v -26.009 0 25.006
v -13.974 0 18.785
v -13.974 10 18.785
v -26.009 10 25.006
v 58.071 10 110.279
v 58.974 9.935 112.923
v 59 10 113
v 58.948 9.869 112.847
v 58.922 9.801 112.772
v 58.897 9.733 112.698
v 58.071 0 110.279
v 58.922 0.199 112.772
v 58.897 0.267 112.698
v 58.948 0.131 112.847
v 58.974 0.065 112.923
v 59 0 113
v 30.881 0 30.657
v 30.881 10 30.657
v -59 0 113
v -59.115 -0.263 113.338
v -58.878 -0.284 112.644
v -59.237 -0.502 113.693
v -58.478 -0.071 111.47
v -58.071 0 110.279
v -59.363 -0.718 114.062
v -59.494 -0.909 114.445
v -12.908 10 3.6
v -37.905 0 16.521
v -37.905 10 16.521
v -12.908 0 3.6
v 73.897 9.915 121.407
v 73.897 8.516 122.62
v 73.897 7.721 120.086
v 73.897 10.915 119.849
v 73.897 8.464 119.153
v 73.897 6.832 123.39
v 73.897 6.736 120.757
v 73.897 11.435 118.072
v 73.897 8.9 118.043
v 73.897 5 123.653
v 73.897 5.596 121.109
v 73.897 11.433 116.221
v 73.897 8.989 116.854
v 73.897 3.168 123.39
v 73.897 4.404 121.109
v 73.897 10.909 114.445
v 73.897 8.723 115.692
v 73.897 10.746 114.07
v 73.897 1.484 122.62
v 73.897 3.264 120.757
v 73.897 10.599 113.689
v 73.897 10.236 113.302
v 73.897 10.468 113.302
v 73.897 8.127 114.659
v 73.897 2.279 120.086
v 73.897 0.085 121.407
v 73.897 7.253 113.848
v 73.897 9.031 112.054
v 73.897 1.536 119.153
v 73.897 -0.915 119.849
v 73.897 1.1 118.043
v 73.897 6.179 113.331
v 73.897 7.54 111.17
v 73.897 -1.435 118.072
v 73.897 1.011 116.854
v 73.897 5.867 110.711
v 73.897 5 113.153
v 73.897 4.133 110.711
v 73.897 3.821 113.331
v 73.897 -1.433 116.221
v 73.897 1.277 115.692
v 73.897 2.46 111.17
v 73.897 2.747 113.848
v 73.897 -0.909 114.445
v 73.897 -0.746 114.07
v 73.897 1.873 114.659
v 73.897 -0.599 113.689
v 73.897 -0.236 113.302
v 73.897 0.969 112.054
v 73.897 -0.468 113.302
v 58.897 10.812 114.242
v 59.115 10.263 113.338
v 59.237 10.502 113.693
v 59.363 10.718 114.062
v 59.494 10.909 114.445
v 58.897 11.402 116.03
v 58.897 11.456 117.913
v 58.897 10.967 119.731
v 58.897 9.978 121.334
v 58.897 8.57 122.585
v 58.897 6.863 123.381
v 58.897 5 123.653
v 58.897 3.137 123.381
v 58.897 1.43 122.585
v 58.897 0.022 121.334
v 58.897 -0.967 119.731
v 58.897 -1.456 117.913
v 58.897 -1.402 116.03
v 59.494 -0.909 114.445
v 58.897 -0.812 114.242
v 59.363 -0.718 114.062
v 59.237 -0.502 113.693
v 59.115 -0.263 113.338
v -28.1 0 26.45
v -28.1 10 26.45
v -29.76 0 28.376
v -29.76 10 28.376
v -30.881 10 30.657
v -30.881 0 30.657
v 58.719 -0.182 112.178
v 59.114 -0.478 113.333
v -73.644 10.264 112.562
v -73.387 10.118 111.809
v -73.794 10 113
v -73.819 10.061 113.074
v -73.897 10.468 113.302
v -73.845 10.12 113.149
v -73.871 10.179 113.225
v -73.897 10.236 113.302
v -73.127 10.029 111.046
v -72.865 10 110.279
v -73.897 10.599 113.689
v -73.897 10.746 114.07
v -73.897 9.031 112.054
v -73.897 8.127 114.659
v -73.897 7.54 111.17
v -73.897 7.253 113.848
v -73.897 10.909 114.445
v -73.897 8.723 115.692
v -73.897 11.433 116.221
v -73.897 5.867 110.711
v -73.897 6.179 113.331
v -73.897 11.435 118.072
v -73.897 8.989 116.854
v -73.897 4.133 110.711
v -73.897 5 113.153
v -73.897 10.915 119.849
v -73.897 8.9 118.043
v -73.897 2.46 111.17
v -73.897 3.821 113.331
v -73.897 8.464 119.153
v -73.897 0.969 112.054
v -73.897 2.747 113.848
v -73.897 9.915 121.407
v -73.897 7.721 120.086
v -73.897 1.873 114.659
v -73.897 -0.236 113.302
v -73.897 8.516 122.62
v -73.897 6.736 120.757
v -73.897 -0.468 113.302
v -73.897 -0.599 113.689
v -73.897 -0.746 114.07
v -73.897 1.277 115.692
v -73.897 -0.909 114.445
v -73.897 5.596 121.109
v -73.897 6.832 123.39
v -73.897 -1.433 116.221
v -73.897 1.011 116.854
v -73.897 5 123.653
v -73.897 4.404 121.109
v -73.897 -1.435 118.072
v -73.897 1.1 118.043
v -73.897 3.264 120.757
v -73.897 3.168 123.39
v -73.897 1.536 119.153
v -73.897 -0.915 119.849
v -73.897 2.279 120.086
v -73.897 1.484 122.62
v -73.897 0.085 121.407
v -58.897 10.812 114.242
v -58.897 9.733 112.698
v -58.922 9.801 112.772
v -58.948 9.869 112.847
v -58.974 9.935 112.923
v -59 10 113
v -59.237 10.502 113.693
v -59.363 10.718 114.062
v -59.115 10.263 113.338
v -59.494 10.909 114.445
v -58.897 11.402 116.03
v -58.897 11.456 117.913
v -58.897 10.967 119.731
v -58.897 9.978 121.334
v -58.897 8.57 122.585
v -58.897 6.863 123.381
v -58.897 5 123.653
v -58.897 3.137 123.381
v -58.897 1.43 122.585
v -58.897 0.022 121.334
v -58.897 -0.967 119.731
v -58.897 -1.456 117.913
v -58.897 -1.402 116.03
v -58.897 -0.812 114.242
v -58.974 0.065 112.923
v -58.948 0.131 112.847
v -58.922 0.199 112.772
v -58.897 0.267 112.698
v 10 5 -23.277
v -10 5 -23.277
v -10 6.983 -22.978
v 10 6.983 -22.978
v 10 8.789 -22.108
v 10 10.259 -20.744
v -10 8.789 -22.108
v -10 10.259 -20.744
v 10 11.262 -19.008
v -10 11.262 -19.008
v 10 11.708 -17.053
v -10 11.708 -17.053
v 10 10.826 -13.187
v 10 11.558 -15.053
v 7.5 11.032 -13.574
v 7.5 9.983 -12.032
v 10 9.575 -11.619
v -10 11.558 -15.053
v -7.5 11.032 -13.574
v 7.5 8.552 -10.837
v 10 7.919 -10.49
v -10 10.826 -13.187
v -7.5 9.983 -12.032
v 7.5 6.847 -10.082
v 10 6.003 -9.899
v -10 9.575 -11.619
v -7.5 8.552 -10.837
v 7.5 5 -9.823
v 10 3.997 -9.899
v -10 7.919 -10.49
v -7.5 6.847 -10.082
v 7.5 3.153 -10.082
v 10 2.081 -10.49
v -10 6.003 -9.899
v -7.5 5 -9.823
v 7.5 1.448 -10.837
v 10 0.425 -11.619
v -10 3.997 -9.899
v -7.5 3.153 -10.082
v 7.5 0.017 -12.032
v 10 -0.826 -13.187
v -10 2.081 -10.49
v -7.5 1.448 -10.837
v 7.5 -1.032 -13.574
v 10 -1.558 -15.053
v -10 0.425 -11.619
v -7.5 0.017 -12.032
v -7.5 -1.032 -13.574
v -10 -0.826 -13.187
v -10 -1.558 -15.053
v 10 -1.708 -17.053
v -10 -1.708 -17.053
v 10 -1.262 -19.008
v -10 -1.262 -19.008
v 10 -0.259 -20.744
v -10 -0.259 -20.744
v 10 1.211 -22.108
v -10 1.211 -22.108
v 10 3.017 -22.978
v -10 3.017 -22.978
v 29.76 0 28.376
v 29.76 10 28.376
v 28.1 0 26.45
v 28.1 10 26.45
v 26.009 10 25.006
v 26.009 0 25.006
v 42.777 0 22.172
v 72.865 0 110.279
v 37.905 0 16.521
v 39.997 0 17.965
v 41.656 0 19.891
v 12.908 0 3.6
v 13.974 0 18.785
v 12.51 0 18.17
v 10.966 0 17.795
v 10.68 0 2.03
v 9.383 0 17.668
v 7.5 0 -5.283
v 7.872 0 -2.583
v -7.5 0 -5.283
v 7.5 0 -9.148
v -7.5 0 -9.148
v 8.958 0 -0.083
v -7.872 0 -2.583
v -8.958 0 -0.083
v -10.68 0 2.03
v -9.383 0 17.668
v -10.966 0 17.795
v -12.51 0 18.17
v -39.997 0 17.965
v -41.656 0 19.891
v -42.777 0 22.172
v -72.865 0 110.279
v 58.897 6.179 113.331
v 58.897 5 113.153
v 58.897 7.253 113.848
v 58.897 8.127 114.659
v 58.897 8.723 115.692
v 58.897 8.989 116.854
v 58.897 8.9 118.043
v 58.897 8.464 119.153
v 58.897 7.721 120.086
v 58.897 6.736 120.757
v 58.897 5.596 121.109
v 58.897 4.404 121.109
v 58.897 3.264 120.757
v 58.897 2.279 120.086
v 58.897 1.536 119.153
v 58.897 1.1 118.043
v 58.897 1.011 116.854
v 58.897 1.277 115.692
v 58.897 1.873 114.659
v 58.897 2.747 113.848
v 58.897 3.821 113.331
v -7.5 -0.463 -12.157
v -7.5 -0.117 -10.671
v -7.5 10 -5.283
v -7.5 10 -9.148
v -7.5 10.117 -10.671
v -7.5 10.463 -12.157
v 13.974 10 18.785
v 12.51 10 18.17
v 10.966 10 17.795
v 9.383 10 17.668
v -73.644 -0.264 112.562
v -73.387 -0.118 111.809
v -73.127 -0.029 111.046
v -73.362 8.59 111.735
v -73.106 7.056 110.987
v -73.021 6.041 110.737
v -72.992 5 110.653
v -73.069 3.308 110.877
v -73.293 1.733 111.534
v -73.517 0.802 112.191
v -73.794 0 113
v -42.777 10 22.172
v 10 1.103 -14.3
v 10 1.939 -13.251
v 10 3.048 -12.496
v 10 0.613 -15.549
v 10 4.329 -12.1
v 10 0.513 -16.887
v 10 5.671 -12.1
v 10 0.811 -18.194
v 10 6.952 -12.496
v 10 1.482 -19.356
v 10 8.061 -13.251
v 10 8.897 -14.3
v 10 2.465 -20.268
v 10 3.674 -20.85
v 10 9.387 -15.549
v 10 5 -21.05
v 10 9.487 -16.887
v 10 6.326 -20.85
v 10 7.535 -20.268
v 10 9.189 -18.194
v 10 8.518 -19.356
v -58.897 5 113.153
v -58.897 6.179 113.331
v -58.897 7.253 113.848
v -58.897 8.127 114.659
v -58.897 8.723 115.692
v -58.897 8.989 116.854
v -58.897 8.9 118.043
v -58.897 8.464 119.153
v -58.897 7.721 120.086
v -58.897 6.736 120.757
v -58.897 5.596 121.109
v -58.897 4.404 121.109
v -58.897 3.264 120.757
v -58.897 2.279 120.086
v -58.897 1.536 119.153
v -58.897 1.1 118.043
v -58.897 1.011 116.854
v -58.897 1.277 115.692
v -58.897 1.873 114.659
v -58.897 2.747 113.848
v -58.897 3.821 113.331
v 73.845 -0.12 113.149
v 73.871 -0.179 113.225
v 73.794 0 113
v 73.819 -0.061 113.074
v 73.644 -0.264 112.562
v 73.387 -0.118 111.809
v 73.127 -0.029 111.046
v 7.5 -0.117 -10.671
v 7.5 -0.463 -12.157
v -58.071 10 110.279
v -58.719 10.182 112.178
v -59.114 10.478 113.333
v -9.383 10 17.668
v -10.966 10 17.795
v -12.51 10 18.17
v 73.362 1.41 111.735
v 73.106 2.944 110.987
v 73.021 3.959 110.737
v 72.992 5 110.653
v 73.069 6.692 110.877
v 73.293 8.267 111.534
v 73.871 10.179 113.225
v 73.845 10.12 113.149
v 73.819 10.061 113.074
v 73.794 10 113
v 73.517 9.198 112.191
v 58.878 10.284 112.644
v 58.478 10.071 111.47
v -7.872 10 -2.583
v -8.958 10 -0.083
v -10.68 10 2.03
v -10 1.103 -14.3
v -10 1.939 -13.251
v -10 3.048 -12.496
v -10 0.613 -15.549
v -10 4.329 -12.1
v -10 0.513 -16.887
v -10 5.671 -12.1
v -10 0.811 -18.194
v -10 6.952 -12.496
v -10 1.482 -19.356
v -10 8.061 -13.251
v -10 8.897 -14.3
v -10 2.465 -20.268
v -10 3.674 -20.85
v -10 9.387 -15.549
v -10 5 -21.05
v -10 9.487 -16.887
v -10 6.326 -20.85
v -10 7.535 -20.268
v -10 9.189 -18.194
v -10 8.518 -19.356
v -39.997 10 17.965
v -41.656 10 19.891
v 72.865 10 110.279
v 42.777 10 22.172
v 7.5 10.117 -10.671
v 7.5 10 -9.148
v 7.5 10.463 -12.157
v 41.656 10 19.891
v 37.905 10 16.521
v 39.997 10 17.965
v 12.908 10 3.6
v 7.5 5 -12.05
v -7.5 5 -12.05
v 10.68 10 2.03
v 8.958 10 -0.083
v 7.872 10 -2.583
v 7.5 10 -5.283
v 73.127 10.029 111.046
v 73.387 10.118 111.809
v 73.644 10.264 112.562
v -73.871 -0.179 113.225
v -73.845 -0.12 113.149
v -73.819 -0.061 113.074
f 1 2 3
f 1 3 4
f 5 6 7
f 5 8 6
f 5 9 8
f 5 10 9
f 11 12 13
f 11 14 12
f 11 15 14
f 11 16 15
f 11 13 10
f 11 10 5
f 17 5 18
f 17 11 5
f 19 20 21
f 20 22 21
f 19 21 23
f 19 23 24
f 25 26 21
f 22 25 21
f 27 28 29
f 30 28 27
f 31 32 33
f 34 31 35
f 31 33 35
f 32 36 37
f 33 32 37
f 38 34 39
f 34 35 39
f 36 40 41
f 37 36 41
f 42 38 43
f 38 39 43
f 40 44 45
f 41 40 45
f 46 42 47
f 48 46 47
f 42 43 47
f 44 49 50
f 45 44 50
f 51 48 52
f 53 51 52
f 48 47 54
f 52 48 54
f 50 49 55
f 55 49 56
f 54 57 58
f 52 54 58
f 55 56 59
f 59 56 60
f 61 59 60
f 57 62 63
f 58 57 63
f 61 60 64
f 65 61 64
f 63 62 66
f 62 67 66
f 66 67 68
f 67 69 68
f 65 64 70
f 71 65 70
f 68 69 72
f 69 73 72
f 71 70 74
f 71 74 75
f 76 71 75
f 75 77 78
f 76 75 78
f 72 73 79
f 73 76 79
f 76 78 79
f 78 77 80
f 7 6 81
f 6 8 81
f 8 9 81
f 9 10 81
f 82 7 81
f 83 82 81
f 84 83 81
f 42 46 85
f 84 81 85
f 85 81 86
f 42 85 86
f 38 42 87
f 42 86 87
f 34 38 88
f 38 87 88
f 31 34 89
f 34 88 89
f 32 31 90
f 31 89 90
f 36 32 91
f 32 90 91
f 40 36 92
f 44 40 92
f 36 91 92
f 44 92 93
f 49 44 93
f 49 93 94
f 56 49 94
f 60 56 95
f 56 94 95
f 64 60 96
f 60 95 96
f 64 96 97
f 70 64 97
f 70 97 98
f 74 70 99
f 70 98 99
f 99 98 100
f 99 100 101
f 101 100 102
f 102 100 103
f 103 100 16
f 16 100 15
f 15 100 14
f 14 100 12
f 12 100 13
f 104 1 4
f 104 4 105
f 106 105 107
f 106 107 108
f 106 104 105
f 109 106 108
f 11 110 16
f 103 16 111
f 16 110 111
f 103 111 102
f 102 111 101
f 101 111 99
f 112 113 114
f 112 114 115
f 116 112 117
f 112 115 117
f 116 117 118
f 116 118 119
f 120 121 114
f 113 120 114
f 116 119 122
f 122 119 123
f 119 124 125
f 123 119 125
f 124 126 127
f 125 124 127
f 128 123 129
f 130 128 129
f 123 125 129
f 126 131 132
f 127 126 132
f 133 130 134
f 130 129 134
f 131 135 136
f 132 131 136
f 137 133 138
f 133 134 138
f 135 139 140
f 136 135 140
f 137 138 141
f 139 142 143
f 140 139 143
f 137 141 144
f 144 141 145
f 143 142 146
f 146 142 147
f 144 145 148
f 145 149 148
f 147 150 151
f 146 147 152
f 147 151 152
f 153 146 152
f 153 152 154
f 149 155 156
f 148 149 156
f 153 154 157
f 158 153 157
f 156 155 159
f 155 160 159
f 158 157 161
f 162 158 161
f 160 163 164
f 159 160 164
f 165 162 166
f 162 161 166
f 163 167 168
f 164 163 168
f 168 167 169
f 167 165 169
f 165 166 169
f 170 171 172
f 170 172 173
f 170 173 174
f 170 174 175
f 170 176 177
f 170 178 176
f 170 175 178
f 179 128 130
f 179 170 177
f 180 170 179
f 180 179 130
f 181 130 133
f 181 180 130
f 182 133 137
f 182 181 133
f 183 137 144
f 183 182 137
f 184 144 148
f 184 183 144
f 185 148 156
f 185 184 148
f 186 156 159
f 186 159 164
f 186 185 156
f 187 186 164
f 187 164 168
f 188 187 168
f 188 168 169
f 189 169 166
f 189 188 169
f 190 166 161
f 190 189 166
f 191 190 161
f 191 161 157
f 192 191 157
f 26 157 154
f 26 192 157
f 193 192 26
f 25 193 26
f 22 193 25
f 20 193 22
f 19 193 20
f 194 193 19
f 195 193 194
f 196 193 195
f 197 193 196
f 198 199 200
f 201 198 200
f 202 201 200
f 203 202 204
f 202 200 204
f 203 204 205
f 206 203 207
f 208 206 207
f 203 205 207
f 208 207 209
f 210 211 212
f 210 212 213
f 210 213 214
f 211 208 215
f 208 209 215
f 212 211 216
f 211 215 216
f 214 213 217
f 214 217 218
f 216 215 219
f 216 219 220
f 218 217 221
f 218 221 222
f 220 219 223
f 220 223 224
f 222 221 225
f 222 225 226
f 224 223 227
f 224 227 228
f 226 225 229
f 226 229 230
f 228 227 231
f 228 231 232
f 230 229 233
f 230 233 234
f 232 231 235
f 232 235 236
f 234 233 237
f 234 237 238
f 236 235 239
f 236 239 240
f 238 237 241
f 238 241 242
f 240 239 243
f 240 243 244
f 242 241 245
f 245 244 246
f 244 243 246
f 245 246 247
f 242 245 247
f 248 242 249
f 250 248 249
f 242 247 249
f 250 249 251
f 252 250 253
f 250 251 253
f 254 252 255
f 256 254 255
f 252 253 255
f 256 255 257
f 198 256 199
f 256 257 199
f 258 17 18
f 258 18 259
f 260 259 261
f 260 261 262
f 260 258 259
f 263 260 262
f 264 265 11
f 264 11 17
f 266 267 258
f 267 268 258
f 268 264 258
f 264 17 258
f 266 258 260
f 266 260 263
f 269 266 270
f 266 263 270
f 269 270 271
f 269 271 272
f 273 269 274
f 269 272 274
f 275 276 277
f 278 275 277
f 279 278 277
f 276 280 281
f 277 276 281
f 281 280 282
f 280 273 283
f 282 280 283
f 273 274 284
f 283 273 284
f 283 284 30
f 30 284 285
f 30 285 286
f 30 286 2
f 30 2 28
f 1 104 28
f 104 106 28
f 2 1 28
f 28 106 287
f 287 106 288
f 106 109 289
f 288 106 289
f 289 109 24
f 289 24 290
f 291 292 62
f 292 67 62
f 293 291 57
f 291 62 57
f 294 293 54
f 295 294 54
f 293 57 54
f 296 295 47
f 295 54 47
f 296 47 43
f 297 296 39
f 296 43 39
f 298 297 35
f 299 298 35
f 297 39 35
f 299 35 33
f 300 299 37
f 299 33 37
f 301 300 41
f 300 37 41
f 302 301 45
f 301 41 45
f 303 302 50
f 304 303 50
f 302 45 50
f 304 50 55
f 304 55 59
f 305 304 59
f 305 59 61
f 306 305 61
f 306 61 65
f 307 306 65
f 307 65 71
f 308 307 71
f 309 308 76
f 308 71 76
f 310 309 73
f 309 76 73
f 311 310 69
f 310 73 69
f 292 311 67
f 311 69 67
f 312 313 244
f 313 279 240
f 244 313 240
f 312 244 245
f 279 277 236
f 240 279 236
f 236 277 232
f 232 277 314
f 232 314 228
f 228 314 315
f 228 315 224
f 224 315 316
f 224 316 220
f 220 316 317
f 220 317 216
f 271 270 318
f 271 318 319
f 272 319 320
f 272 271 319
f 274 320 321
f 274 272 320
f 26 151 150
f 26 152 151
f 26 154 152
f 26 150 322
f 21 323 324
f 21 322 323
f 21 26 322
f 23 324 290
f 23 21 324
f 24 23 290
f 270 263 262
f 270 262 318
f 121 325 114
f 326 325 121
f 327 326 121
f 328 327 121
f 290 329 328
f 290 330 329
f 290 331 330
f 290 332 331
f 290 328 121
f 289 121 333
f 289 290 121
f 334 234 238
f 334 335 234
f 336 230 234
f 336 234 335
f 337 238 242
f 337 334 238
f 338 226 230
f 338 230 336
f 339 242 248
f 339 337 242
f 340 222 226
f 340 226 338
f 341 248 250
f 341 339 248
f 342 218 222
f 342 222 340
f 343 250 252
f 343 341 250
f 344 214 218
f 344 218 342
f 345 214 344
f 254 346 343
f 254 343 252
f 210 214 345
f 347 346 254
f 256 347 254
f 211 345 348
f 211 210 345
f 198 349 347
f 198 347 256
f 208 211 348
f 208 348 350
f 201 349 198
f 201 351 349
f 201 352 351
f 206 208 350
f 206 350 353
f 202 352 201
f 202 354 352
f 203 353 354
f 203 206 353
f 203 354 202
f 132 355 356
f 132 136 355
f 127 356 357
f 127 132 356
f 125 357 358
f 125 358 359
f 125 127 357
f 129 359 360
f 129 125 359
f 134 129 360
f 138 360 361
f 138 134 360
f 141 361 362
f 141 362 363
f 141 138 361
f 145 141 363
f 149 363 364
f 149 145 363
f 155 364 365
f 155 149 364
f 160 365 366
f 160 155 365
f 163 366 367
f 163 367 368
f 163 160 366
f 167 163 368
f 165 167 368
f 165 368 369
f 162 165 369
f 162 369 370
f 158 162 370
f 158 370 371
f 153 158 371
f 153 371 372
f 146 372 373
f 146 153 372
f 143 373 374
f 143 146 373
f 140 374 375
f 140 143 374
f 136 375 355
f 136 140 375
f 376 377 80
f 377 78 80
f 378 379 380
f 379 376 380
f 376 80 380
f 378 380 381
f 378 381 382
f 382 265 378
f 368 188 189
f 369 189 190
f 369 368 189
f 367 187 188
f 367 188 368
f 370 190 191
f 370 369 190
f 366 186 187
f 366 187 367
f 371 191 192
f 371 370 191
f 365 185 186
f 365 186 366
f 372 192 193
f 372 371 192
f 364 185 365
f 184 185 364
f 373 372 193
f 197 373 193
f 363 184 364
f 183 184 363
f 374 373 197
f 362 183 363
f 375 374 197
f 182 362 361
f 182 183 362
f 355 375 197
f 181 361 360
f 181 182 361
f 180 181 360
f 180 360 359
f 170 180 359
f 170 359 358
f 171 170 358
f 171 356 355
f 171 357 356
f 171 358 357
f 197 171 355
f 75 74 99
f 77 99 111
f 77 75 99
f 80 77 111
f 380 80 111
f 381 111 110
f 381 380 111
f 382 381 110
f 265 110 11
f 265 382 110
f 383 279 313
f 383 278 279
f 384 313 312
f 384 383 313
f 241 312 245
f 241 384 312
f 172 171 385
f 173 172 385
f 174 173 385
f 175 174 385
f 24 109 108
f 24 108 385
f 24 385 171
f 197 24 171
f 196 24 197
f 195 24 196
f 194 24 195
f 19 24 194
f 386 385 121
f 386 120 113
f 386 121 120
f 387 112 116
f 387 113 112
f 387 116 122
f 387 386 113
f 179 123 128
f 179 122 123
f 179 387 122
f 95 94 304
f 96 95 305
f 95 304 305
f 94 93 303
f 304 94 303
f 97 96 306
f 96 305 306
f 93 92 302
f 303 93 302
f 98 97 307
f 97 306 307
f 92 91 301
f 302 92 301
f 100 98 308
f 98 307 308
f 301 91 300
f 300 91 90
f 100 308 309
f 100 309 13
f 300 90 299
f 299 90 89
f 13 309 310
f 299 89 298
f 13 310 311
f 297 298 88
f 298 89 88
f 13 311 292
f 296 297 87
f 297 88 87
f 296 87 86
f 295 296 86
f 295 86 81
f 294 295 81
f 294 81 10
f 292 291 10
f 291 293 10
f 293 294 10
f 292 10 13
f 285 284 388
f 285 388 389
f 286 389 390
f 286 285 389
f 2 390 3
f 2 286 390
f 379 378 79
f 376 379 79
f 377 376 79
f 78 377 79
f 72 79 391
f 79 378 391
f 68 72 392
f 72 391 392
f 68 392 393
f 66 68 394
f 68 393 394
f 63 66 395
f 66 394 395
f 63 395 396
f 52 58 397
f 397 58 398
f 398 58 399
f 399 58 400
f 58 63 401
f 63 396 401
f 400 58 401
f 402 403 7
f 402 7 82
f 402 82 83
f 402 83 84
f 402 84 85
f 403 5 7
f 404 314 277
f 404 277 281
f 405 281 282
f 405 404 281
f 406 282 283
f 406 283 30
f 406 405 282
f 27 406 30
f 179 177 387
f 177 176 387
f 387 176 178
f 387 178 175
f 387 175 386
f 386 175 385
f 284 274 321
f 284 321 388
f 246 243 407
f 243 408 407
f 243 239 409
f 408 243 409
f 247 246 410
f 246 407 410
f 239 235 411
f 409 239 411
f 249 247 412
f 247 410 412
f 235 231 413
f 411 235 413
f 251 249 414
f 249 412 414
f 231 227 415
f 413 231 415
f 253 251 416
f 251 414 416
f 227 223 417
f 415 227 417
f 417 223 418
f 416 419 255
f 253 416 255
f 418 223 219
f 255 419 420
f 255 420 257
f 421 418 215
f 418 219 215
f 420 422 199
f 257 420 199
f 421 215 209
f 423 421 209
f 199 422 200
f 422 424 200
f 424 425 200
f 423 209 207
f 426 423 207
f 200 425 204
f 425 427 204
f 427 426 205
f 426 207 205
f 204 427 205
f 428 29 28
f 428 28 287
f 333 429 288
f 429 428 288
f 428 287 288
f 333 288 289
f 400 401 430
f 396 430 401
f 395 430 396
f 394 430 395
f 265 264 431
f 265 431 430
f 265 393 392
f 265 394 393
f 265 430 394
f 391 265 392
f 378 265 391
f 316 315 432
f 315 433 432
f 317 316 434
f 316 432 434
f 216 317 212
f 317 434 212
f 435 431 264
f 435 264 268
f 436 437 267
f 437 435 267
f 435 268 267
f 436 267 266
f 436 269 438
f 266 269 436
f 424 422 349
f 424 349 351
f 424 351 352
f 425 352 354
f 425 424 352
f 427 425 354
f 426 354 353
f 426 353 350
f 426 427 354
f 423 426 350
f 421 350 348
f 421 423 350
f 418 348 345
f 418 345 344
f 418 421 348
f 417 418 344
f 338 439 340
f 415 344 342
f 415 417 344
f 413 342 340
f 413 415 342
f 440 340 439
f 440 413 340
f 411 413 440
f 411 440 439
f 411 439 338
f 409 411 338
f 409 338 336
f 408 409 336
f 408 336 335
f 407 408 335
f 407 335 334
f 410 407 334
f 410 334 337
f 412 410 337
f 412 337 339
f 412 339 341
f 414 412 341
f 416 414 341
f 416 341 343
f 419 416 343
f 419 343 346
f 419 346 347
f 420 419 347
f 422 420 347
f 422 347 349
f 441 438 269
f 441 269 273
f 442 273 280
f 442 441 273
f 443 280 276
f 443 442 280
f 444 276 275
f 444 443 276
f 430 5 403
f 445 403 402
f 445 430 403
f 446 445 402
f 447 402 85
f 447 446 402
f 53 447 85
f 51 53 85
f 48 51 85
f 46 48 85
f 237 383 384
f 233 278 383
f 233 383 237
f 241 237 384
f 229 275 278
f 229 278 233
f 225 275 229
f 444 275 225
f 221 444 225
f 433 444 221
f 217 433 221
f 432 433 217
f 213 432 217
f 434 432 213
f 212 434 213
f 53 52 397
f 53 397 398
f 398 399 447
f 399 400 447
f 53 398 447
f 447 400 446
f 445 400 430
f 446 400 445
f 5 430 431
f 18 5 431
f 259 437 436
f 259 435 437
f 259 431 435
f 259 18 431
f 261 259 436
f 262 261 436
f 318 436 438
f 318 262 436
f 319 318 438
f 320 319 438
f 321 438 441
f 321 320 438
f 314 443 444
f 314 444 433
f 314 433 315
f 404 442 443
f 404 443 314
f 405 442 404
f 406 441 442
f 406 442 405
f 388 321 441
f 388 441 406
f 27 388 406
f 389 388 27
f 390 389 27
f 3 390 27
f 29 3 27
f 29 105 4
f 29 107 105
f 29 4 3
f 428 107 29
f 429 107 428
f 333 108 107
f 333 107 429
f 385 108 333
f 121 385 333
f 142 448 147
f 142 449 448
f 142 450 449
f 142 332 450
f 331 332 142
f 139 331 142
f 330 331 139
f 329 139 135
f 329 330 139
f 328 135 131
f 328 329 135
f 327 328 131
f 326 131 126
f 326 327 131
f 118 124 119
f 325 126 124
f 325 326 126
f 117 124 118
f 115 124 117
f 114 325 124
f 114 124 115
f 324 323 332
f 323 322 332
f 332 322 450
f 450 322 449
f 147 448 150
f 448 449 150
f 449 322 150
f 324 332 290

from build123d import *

# Parameters (mm, degrees)
BOSS_EXTRUDE1_DEPTH      = 10
SKETCH3_R                = 6.5
SKETCH3_R_2              = 4
BOSS_EXTRUDE3_DEPTH      = 7.5
SKETCH7_W                = 15
SKETCH7_H                = 12.050233058
BOSS_EXTRUDE4_DEPTH      = 10
BOSS_EXTRUDE5_DEPTH      = 10
BOSS_EXTRUDE5_DEPTH_BACK = 10
SKETCH9_R                = 6.726812024
SKETCH9_R_2              = 4.5
FILLET1_R                = 10
FILLET2_R                = 10
FILLET3_R                = 10
FILLET4_R                = 10


with BuildPart() as part:
    # Sketch1 → Boss-Extrude1 (new body)
    with BuildSketch(Plane(origin=(0, 0, 0), x_dir=(1, 0, 0), z_dir=(0, 1, 0))):
        Polygon((-11.814153955, -17.668422436), (-29.581045004, -26.851971991), (-59, -113), (-73.793817424, -113), (-41.477337097, -18.36709911), (-5.943554998, 0), (5.943554998, 0), (41.477337097, -18.36709911), (73.793817424, -113), (59, -113), (29.581045004, -26.851971991), (11.814153955, -17.668422436), align=None)
    extrude(amount=BOSS_EXTRUDE1_DEPTH)

    # Sketch3 → Boss-Extrude3 (add, symmetric)
    with BuildSketch(Plane(origin=(-66.396908712, 0, 0), x_dir=(0, 0, -1), z_dir=(1, 0, 0))):
        with Locations((-117.153311931, 5)):
            Circle(SKETCH3_R)
        with Locations((-117.153311931, 5)):
            Circle(SKETCH3_R_2, mode=Mode.SUBTRACT)
    boss_extrude3 = extrude(amount=BOSS_EXTRUDE3_DEPTH, both=True)

    # Mirror3: Boss-Extrude3 across plane
    add(boss_extrude3.mirror(Plane(origin=(0, 0, 0), x_dir=(0, 0, 1), z_dir=(1, 0, 0))))

    # Sketch7 → Boss-Extrude4 (add)
    with BuildSketch(Plane(origin=(0, 10, 0), x_dir=(1, 0, 0), z_dir=(0, 1, 0))):
        with Locations((0, 6.025116529)):
            Rectangle(SKETCH7_W, SKETCH7_H)
    extrude(amount=-BOSS_EXTRUDE4_DEPTH)

    # Sketch9 → Boss-Extrude5 (add, two sides: drawn at the far end of the back side and taken through both)
    with BuildSketch(Plane(origin=(0, 0, 0), x_dir=(0, 0, -1), z_dir=(1, 0, 0)).offset(-BOSS_EXTRUDE5_DEPTH_BACK)):
        with Locations((16.550233058, 5)):
            Circle(SKETCH9_R)
        with Locations((16.550233058, 5)):
            Circle(SKETCH9_R_2, mode=Mode.SUBTRACT)
    extrude(amount=BOSS_EXTRUDE5_DEPTH + BOSS_EXTRUDE5_DEPTH_BACK)

    # Fillet1
    # the kernel refuses this fillet: 10 mm, written as the material it adds along each edge
    with BuildSketch(Plane(origin=(-5.943554998, 0, 0), x_dir=(-0.88834455248328, 0, 0.4591774777504672), z_dir=(0, 1, 0))) as fillet1_piece_1:
        with BuildLine():
            CenterArc((5.095194407, -10), FILLET1_R, 90, 21.792944461)
            Line((1.382659439, -0.71468449), (0, 0))
            Line((0, 0), (5.095194407, 0))
        make_face()
    extrude(amount=10)

    # Fillet2
    # the kernel refuses this fillet: 10 mm, written as the material it adds along each edge
    with BuildSketch(Plane(origin=(5.943554998, 0, 0), x_dir=(0.8883445524832799, 0, 0.4591774777504676), z_dir=(0, 1, 0))) as fillet2_piece_1:
        with BuildLine():
            CenterArc((5.095194407, 10), FILLET2_R, 248.207055539, 21.792944461)
            Line((1.382659439, 0.71468449), (0, 0))
            Line((0, 0), (5.095194407, 0))
        make_face()
    extrude(amount=10)

    # Fillet3
    # the kernel refuses this fillet: 10 mm, written as the material it adds along each edge
    with BuildSketch(Plane(origin=(11.814153955, 0, 17.668422436), x_dir=(0.8883445524832799, 0, 0.4591774777504676), z_dir=(0, 1, 0)), Plane(origin=(-11.814153955, 0, 17.668422436), x_dir=(1, 0, 0), z_dir=(0, 1, 0))) as fillet3_piece_1:
        with BuildLine():
            CenterArc((FILLET3_R * 0.243164033357, -FILLET3_R), FILLET3_R, 90, 27.334044372)
            Line((-FILLET3_R * 0.216013444393, -FILLET3_R * 0.111655447517), (0, 0))
            Line((0, 0), (FILLET3_R * 0.243164033357, 0))
        make_face()
    extrude(amount=10)
    with BuildSketch(Plane(origin=(29.581045004, 0, 26.851971991), x_dir=(0.3231689910588884, 0, 0.946341272067313), z_dir=(0, 1, 0)), Plane(origin=(-29.581045004, 0, 26.851971991), x_dir=(0.8883445524832806, 0, -0.4591774777504663), z_dir=(0, 1, 0))) as fillet3_piece_2:
        with BuildLine():
            CenterArc((FILLET3_R * 0.402111719604, -FILLET3_R), FILLET3_R, 90, 43.811274916)
            Line((-FILLET3_R * 0.290173472026, -FILLET3_R * 0.278375988862), (0, 0))
            Line((0, 0), (FILLET3_R * 0.402111719604, 0))
        make_face()
    extrude(amount=10)
    with BuildSketch(Plane(origin=(-52.198620973, 10, 113), x_dir=(0, 0, -1), z_dir=(-1, 0, 0))) as fillet3_piece_3_section:
        with BuildLine():
            CenterArc((2.720551611, -10), FILLET3_R, 90, 24.619977329)
            ThreePointArc((-1.445426294, -0.909090909), (-0.692731114, -0.502215954), (0, 0))
            Line((0, 0), (2.720551611, 0))
        make_face()
    fillet3_piece_3 = extrude(amount=28.396575479, mode=Mode.PRIVATE)
    fillet3_piece_3 = split(fillet3_piece_3, bisect_by=Plane(origin=(-58.289676239, 10, 110.919946807), z_dir=(-0.9463412720673133, 0, -0.3231689910588876)), keep=Keep.TOP, mode=Mode.PRIVATE)
    fillet3_piece_3 = split(fillet3_piece_3, bisect_by=Plane(origin=(-71.538454048, 10, 106.395580932), z_dir=(0.9463412720673133, 0, 0.3231689910588875)), keep=Keep.TOP, mode=Mode.PRIVATE)
    fillet3_piece_3 = split(fillet3_piece_3, bisect_by=Plane(origin=(-73.896908712, 10, 113), z_dir=(1, 0, 0)), keep=Keep.TOP, mode=Mode.PRIVATE)
    add(fillet3_piece_3)
    with BuildSketch(Plane(origin=(80.595196452, 10, 113), x_dir=(0, 0, -1), z_dir=(-1, 0, 0))) as fillet3_piece_4_section:
        with BuildLine():
            CenterArc((2.720551611, -10), FILLET3_R, 90, 24.619977329)
            ThreePointArc((-1.445426294, -0.909090909), (-0.692731114, -0.502215954), (0, 0))
            Line((0, 0), (2.720551611, 0))
        make_face()
    fillet3_piece_4 = extrude(amount=28.396575479, mode=Mode.PRIVATE)
    fillet3_piece_4 = split(fillet3_piece_4, bisect_by=Plane(origin=(74.504141186, 10, 115.080053193), z_dir=(-0.9463412720673132, 0, 0.32316899105888797)), keep=Keep.TOP, mode=Mode.PRIVATE)
    fillet3_piece_4 = split(fillet3_piece_4, bisect_by=Plane(origin=(61.255363377, 10, 119.604419068), z_dir=(0.9463412720673132, 0, -0.32316899105888797)), keep=Keep.TOP, mode=Mode.PRIVATE)
    fillet3_piece_4 = split(fillet3_piece_4, bisect_by=Plane(origin=(73.896908712, 10, 113), z_dir=(-1, 0, 0)), keep=Keep.TOP, mode=Mode.PRIVATE)
    add(fillet3_piece_4)
    with BuildSketch(Plane(origin=(80.595196452, 0, 113), x_dir=(0, 0, -1), z_dir=(-1, 0, 0))) as fillet3_piece_5_section:
        with BuildLine():
            CenterArc((2.720551611, 10), FILLET3_R, 245.380022671, 24.619977329)
            ThreePointArc((-1.445426294, 0.909090909), (-0.692731114, 0.502215954), (0, 0))
            Line((0, 0), (2.720551611, 0))
        make_face()
    fillet3_piece_5 = extrude(amount=28.396575479, mode=Mode.PRIVATE)
    fillet3_piece_5 = split(fillet3_piece_5, bisect_by=Plane(origin=(74.504141186, 0, 115.080053193), z_dir=(-0.9463412720673132, 0, 0.32316899105888797)), keep=Keep.TOP, mode=Mode.PRIVATE)
    fillet3_piece_5 = split(fillet3_piece_5, bisect_by=Plane(origin=(61.255363377, 0, 119.604419068), z_dir=(0.9463412720673132, 0, -0.32316899105888797)), keep=Keep.TOP, mode=Mode.PRIVATE)
    fillet3_piece_5 = split(fillet3_piece_5, bisect_by=Plane(origin=(73.896908712, 0, 113), z_dir=(-1, 0, 0)), keep=Keep.TOP, mode=Mode.PRIVATE)
    add(fillet3_piece_5)
    with BuildSketch(Plane(origin=(-52.198620973, 0, 113), x_dir=(0, 0, -1), z_dir=(-1, 0, 0))) as fillet3_piece_6_section:
        with BuildLine():
            CenterArc((2.720551611, 10), FILLET3_R, 245.380022671, 24.619977329)
            ThreePointArc((-1.445426294, 0.909090909), (-0.692731114, 0.502215954), (0, 0))
            Line((0, 0), (2.720551611, 0))
        make_face()
    fillet3_piece_6 = extrude(amount=28.396575479, mode=Mode.PRIVATE)
    fillet3_piece_6 = split(fillet3_piece_6, bisect_by=Plane(origin=(-58.289676239, 0, 110.919946807), z_dir=(-0.9463412720673133, 0, -0.3231689910588876)), keep=Keep.TOP, mode=Mode.PRIVATE)
    fillet3_piece_6 = split(fillet3_piece_6, bisect_by=Plane(origin=(-71.538454048, 0, 106.395580932), z_dir=(0.9463412720673133, 0, 0.3231689910588875)), keep=Keep.TOP, mode=Mode.PRIVATE)
    fillet3_piece_6 = split(fillet3_piece_6, bisect_by=Plane(origin=(-73.896908712, 0, 113), z_dir=(1, 0, 0)), keep=Keep.TOP, mode=Mode.PRIVATE)
    add(fillet3_piece_6)
    with BuildSketch(Plane(origin=(-7.5, 10, 0), x_dir=(-0.8324412912652444, 0, 0.5541132525004725), z_dir=(0, -1, 0))) as fillet3_piece_7:
        with BuildLine():
            CenterArc((5.396772828, 9.93931012), FILLET3_R, 213.649659515, 62.665955628)
            Line((-2.927640085, 4.398177595), (-3.760081376, 3.844064343))
            Line((-3.760081376, 3.844064343), (-0.832441291, -0.554113253))
            Line((-0.832441291, -0.554113253), (-0.266857068, -0.963736118))
            ThreePointArc((-0.266857068, -0.963736118), (3.878627843, -1.295879951), (6.606829993, -0.993931012))
            Line((6.606829993, -0.993931012), (6.496824796, 0))
        make_face()
    extrude(amount=10)
    with BuildSketch(Plane(origin=(7.5, 10, 0), x_dir=(0.832441291265244, 0, 0.5541132525004732), z_dir=(0, -1, 0))) as fillet3_piece_8:
        with BuildLine():
            CenterArc((5.396772828, -9.93931012), FILLET3_R, 83.684384857, 62.665955628)
            Line((-2.927640085, -4.398177595), (-3.760081376, -3.844064343))
            Line((-3.760081376, -3.844064343), (-0.832441291, 0.554113253))
            Line((-0.832441291, 0.554113253), (-0.266857068, 0.963736118))
            ThreePointArc((-0.266857068, 0.963736118), (3.878627843, 1.295879951), (6.606829993, 0.993931012))
            Line((6.606829993, 0.993931012), (6.496824796, 0))
        make_face()
    extrude(amount=10)
    # the kernel refuses this fillet: 10 mm, written as the material it takes off along each edge
    with BuildSketch(Plane(origin=(41.477337097, -10.05279299, 18.36709911), x_dir=(0.3231689910588881, 0, 0.9463412720673132), z_dir=(0, 1, 0)), Plane(origin=(-41.477337097, -10.05279299, 18.36709911), x_dir=(0.8883445524832805, 0, -0.4591774777504667), z_dir=(0, 1, 0))) as fillet3_2_piece_1:
        with BuildLine():
            CenterArc((FILLET3_R * 0.402111719604, -FILLET3_R), FILLET3_R, 90, 43.811274916)
            Line((-FILLET3_R * 0.290173472026, -FILLET3_R * 0.278375988862), (0, 0))
            Line((0, 0), (FILLET3_R * 0.402111719604, 0))
        make_face()
    extrude(amount=30.10558598, mode=Mode.SUBTRACT)

    # Fillet4
    fillet4_edges = [part.edges().sort_by_distance(p)[0] for p in [
        (0, 10, -12.050233058),
        (0, 0, -12.050233058),
    ]]
    fillet(fillet4_edges, radius=FILLET4_R)


solid = part.part
